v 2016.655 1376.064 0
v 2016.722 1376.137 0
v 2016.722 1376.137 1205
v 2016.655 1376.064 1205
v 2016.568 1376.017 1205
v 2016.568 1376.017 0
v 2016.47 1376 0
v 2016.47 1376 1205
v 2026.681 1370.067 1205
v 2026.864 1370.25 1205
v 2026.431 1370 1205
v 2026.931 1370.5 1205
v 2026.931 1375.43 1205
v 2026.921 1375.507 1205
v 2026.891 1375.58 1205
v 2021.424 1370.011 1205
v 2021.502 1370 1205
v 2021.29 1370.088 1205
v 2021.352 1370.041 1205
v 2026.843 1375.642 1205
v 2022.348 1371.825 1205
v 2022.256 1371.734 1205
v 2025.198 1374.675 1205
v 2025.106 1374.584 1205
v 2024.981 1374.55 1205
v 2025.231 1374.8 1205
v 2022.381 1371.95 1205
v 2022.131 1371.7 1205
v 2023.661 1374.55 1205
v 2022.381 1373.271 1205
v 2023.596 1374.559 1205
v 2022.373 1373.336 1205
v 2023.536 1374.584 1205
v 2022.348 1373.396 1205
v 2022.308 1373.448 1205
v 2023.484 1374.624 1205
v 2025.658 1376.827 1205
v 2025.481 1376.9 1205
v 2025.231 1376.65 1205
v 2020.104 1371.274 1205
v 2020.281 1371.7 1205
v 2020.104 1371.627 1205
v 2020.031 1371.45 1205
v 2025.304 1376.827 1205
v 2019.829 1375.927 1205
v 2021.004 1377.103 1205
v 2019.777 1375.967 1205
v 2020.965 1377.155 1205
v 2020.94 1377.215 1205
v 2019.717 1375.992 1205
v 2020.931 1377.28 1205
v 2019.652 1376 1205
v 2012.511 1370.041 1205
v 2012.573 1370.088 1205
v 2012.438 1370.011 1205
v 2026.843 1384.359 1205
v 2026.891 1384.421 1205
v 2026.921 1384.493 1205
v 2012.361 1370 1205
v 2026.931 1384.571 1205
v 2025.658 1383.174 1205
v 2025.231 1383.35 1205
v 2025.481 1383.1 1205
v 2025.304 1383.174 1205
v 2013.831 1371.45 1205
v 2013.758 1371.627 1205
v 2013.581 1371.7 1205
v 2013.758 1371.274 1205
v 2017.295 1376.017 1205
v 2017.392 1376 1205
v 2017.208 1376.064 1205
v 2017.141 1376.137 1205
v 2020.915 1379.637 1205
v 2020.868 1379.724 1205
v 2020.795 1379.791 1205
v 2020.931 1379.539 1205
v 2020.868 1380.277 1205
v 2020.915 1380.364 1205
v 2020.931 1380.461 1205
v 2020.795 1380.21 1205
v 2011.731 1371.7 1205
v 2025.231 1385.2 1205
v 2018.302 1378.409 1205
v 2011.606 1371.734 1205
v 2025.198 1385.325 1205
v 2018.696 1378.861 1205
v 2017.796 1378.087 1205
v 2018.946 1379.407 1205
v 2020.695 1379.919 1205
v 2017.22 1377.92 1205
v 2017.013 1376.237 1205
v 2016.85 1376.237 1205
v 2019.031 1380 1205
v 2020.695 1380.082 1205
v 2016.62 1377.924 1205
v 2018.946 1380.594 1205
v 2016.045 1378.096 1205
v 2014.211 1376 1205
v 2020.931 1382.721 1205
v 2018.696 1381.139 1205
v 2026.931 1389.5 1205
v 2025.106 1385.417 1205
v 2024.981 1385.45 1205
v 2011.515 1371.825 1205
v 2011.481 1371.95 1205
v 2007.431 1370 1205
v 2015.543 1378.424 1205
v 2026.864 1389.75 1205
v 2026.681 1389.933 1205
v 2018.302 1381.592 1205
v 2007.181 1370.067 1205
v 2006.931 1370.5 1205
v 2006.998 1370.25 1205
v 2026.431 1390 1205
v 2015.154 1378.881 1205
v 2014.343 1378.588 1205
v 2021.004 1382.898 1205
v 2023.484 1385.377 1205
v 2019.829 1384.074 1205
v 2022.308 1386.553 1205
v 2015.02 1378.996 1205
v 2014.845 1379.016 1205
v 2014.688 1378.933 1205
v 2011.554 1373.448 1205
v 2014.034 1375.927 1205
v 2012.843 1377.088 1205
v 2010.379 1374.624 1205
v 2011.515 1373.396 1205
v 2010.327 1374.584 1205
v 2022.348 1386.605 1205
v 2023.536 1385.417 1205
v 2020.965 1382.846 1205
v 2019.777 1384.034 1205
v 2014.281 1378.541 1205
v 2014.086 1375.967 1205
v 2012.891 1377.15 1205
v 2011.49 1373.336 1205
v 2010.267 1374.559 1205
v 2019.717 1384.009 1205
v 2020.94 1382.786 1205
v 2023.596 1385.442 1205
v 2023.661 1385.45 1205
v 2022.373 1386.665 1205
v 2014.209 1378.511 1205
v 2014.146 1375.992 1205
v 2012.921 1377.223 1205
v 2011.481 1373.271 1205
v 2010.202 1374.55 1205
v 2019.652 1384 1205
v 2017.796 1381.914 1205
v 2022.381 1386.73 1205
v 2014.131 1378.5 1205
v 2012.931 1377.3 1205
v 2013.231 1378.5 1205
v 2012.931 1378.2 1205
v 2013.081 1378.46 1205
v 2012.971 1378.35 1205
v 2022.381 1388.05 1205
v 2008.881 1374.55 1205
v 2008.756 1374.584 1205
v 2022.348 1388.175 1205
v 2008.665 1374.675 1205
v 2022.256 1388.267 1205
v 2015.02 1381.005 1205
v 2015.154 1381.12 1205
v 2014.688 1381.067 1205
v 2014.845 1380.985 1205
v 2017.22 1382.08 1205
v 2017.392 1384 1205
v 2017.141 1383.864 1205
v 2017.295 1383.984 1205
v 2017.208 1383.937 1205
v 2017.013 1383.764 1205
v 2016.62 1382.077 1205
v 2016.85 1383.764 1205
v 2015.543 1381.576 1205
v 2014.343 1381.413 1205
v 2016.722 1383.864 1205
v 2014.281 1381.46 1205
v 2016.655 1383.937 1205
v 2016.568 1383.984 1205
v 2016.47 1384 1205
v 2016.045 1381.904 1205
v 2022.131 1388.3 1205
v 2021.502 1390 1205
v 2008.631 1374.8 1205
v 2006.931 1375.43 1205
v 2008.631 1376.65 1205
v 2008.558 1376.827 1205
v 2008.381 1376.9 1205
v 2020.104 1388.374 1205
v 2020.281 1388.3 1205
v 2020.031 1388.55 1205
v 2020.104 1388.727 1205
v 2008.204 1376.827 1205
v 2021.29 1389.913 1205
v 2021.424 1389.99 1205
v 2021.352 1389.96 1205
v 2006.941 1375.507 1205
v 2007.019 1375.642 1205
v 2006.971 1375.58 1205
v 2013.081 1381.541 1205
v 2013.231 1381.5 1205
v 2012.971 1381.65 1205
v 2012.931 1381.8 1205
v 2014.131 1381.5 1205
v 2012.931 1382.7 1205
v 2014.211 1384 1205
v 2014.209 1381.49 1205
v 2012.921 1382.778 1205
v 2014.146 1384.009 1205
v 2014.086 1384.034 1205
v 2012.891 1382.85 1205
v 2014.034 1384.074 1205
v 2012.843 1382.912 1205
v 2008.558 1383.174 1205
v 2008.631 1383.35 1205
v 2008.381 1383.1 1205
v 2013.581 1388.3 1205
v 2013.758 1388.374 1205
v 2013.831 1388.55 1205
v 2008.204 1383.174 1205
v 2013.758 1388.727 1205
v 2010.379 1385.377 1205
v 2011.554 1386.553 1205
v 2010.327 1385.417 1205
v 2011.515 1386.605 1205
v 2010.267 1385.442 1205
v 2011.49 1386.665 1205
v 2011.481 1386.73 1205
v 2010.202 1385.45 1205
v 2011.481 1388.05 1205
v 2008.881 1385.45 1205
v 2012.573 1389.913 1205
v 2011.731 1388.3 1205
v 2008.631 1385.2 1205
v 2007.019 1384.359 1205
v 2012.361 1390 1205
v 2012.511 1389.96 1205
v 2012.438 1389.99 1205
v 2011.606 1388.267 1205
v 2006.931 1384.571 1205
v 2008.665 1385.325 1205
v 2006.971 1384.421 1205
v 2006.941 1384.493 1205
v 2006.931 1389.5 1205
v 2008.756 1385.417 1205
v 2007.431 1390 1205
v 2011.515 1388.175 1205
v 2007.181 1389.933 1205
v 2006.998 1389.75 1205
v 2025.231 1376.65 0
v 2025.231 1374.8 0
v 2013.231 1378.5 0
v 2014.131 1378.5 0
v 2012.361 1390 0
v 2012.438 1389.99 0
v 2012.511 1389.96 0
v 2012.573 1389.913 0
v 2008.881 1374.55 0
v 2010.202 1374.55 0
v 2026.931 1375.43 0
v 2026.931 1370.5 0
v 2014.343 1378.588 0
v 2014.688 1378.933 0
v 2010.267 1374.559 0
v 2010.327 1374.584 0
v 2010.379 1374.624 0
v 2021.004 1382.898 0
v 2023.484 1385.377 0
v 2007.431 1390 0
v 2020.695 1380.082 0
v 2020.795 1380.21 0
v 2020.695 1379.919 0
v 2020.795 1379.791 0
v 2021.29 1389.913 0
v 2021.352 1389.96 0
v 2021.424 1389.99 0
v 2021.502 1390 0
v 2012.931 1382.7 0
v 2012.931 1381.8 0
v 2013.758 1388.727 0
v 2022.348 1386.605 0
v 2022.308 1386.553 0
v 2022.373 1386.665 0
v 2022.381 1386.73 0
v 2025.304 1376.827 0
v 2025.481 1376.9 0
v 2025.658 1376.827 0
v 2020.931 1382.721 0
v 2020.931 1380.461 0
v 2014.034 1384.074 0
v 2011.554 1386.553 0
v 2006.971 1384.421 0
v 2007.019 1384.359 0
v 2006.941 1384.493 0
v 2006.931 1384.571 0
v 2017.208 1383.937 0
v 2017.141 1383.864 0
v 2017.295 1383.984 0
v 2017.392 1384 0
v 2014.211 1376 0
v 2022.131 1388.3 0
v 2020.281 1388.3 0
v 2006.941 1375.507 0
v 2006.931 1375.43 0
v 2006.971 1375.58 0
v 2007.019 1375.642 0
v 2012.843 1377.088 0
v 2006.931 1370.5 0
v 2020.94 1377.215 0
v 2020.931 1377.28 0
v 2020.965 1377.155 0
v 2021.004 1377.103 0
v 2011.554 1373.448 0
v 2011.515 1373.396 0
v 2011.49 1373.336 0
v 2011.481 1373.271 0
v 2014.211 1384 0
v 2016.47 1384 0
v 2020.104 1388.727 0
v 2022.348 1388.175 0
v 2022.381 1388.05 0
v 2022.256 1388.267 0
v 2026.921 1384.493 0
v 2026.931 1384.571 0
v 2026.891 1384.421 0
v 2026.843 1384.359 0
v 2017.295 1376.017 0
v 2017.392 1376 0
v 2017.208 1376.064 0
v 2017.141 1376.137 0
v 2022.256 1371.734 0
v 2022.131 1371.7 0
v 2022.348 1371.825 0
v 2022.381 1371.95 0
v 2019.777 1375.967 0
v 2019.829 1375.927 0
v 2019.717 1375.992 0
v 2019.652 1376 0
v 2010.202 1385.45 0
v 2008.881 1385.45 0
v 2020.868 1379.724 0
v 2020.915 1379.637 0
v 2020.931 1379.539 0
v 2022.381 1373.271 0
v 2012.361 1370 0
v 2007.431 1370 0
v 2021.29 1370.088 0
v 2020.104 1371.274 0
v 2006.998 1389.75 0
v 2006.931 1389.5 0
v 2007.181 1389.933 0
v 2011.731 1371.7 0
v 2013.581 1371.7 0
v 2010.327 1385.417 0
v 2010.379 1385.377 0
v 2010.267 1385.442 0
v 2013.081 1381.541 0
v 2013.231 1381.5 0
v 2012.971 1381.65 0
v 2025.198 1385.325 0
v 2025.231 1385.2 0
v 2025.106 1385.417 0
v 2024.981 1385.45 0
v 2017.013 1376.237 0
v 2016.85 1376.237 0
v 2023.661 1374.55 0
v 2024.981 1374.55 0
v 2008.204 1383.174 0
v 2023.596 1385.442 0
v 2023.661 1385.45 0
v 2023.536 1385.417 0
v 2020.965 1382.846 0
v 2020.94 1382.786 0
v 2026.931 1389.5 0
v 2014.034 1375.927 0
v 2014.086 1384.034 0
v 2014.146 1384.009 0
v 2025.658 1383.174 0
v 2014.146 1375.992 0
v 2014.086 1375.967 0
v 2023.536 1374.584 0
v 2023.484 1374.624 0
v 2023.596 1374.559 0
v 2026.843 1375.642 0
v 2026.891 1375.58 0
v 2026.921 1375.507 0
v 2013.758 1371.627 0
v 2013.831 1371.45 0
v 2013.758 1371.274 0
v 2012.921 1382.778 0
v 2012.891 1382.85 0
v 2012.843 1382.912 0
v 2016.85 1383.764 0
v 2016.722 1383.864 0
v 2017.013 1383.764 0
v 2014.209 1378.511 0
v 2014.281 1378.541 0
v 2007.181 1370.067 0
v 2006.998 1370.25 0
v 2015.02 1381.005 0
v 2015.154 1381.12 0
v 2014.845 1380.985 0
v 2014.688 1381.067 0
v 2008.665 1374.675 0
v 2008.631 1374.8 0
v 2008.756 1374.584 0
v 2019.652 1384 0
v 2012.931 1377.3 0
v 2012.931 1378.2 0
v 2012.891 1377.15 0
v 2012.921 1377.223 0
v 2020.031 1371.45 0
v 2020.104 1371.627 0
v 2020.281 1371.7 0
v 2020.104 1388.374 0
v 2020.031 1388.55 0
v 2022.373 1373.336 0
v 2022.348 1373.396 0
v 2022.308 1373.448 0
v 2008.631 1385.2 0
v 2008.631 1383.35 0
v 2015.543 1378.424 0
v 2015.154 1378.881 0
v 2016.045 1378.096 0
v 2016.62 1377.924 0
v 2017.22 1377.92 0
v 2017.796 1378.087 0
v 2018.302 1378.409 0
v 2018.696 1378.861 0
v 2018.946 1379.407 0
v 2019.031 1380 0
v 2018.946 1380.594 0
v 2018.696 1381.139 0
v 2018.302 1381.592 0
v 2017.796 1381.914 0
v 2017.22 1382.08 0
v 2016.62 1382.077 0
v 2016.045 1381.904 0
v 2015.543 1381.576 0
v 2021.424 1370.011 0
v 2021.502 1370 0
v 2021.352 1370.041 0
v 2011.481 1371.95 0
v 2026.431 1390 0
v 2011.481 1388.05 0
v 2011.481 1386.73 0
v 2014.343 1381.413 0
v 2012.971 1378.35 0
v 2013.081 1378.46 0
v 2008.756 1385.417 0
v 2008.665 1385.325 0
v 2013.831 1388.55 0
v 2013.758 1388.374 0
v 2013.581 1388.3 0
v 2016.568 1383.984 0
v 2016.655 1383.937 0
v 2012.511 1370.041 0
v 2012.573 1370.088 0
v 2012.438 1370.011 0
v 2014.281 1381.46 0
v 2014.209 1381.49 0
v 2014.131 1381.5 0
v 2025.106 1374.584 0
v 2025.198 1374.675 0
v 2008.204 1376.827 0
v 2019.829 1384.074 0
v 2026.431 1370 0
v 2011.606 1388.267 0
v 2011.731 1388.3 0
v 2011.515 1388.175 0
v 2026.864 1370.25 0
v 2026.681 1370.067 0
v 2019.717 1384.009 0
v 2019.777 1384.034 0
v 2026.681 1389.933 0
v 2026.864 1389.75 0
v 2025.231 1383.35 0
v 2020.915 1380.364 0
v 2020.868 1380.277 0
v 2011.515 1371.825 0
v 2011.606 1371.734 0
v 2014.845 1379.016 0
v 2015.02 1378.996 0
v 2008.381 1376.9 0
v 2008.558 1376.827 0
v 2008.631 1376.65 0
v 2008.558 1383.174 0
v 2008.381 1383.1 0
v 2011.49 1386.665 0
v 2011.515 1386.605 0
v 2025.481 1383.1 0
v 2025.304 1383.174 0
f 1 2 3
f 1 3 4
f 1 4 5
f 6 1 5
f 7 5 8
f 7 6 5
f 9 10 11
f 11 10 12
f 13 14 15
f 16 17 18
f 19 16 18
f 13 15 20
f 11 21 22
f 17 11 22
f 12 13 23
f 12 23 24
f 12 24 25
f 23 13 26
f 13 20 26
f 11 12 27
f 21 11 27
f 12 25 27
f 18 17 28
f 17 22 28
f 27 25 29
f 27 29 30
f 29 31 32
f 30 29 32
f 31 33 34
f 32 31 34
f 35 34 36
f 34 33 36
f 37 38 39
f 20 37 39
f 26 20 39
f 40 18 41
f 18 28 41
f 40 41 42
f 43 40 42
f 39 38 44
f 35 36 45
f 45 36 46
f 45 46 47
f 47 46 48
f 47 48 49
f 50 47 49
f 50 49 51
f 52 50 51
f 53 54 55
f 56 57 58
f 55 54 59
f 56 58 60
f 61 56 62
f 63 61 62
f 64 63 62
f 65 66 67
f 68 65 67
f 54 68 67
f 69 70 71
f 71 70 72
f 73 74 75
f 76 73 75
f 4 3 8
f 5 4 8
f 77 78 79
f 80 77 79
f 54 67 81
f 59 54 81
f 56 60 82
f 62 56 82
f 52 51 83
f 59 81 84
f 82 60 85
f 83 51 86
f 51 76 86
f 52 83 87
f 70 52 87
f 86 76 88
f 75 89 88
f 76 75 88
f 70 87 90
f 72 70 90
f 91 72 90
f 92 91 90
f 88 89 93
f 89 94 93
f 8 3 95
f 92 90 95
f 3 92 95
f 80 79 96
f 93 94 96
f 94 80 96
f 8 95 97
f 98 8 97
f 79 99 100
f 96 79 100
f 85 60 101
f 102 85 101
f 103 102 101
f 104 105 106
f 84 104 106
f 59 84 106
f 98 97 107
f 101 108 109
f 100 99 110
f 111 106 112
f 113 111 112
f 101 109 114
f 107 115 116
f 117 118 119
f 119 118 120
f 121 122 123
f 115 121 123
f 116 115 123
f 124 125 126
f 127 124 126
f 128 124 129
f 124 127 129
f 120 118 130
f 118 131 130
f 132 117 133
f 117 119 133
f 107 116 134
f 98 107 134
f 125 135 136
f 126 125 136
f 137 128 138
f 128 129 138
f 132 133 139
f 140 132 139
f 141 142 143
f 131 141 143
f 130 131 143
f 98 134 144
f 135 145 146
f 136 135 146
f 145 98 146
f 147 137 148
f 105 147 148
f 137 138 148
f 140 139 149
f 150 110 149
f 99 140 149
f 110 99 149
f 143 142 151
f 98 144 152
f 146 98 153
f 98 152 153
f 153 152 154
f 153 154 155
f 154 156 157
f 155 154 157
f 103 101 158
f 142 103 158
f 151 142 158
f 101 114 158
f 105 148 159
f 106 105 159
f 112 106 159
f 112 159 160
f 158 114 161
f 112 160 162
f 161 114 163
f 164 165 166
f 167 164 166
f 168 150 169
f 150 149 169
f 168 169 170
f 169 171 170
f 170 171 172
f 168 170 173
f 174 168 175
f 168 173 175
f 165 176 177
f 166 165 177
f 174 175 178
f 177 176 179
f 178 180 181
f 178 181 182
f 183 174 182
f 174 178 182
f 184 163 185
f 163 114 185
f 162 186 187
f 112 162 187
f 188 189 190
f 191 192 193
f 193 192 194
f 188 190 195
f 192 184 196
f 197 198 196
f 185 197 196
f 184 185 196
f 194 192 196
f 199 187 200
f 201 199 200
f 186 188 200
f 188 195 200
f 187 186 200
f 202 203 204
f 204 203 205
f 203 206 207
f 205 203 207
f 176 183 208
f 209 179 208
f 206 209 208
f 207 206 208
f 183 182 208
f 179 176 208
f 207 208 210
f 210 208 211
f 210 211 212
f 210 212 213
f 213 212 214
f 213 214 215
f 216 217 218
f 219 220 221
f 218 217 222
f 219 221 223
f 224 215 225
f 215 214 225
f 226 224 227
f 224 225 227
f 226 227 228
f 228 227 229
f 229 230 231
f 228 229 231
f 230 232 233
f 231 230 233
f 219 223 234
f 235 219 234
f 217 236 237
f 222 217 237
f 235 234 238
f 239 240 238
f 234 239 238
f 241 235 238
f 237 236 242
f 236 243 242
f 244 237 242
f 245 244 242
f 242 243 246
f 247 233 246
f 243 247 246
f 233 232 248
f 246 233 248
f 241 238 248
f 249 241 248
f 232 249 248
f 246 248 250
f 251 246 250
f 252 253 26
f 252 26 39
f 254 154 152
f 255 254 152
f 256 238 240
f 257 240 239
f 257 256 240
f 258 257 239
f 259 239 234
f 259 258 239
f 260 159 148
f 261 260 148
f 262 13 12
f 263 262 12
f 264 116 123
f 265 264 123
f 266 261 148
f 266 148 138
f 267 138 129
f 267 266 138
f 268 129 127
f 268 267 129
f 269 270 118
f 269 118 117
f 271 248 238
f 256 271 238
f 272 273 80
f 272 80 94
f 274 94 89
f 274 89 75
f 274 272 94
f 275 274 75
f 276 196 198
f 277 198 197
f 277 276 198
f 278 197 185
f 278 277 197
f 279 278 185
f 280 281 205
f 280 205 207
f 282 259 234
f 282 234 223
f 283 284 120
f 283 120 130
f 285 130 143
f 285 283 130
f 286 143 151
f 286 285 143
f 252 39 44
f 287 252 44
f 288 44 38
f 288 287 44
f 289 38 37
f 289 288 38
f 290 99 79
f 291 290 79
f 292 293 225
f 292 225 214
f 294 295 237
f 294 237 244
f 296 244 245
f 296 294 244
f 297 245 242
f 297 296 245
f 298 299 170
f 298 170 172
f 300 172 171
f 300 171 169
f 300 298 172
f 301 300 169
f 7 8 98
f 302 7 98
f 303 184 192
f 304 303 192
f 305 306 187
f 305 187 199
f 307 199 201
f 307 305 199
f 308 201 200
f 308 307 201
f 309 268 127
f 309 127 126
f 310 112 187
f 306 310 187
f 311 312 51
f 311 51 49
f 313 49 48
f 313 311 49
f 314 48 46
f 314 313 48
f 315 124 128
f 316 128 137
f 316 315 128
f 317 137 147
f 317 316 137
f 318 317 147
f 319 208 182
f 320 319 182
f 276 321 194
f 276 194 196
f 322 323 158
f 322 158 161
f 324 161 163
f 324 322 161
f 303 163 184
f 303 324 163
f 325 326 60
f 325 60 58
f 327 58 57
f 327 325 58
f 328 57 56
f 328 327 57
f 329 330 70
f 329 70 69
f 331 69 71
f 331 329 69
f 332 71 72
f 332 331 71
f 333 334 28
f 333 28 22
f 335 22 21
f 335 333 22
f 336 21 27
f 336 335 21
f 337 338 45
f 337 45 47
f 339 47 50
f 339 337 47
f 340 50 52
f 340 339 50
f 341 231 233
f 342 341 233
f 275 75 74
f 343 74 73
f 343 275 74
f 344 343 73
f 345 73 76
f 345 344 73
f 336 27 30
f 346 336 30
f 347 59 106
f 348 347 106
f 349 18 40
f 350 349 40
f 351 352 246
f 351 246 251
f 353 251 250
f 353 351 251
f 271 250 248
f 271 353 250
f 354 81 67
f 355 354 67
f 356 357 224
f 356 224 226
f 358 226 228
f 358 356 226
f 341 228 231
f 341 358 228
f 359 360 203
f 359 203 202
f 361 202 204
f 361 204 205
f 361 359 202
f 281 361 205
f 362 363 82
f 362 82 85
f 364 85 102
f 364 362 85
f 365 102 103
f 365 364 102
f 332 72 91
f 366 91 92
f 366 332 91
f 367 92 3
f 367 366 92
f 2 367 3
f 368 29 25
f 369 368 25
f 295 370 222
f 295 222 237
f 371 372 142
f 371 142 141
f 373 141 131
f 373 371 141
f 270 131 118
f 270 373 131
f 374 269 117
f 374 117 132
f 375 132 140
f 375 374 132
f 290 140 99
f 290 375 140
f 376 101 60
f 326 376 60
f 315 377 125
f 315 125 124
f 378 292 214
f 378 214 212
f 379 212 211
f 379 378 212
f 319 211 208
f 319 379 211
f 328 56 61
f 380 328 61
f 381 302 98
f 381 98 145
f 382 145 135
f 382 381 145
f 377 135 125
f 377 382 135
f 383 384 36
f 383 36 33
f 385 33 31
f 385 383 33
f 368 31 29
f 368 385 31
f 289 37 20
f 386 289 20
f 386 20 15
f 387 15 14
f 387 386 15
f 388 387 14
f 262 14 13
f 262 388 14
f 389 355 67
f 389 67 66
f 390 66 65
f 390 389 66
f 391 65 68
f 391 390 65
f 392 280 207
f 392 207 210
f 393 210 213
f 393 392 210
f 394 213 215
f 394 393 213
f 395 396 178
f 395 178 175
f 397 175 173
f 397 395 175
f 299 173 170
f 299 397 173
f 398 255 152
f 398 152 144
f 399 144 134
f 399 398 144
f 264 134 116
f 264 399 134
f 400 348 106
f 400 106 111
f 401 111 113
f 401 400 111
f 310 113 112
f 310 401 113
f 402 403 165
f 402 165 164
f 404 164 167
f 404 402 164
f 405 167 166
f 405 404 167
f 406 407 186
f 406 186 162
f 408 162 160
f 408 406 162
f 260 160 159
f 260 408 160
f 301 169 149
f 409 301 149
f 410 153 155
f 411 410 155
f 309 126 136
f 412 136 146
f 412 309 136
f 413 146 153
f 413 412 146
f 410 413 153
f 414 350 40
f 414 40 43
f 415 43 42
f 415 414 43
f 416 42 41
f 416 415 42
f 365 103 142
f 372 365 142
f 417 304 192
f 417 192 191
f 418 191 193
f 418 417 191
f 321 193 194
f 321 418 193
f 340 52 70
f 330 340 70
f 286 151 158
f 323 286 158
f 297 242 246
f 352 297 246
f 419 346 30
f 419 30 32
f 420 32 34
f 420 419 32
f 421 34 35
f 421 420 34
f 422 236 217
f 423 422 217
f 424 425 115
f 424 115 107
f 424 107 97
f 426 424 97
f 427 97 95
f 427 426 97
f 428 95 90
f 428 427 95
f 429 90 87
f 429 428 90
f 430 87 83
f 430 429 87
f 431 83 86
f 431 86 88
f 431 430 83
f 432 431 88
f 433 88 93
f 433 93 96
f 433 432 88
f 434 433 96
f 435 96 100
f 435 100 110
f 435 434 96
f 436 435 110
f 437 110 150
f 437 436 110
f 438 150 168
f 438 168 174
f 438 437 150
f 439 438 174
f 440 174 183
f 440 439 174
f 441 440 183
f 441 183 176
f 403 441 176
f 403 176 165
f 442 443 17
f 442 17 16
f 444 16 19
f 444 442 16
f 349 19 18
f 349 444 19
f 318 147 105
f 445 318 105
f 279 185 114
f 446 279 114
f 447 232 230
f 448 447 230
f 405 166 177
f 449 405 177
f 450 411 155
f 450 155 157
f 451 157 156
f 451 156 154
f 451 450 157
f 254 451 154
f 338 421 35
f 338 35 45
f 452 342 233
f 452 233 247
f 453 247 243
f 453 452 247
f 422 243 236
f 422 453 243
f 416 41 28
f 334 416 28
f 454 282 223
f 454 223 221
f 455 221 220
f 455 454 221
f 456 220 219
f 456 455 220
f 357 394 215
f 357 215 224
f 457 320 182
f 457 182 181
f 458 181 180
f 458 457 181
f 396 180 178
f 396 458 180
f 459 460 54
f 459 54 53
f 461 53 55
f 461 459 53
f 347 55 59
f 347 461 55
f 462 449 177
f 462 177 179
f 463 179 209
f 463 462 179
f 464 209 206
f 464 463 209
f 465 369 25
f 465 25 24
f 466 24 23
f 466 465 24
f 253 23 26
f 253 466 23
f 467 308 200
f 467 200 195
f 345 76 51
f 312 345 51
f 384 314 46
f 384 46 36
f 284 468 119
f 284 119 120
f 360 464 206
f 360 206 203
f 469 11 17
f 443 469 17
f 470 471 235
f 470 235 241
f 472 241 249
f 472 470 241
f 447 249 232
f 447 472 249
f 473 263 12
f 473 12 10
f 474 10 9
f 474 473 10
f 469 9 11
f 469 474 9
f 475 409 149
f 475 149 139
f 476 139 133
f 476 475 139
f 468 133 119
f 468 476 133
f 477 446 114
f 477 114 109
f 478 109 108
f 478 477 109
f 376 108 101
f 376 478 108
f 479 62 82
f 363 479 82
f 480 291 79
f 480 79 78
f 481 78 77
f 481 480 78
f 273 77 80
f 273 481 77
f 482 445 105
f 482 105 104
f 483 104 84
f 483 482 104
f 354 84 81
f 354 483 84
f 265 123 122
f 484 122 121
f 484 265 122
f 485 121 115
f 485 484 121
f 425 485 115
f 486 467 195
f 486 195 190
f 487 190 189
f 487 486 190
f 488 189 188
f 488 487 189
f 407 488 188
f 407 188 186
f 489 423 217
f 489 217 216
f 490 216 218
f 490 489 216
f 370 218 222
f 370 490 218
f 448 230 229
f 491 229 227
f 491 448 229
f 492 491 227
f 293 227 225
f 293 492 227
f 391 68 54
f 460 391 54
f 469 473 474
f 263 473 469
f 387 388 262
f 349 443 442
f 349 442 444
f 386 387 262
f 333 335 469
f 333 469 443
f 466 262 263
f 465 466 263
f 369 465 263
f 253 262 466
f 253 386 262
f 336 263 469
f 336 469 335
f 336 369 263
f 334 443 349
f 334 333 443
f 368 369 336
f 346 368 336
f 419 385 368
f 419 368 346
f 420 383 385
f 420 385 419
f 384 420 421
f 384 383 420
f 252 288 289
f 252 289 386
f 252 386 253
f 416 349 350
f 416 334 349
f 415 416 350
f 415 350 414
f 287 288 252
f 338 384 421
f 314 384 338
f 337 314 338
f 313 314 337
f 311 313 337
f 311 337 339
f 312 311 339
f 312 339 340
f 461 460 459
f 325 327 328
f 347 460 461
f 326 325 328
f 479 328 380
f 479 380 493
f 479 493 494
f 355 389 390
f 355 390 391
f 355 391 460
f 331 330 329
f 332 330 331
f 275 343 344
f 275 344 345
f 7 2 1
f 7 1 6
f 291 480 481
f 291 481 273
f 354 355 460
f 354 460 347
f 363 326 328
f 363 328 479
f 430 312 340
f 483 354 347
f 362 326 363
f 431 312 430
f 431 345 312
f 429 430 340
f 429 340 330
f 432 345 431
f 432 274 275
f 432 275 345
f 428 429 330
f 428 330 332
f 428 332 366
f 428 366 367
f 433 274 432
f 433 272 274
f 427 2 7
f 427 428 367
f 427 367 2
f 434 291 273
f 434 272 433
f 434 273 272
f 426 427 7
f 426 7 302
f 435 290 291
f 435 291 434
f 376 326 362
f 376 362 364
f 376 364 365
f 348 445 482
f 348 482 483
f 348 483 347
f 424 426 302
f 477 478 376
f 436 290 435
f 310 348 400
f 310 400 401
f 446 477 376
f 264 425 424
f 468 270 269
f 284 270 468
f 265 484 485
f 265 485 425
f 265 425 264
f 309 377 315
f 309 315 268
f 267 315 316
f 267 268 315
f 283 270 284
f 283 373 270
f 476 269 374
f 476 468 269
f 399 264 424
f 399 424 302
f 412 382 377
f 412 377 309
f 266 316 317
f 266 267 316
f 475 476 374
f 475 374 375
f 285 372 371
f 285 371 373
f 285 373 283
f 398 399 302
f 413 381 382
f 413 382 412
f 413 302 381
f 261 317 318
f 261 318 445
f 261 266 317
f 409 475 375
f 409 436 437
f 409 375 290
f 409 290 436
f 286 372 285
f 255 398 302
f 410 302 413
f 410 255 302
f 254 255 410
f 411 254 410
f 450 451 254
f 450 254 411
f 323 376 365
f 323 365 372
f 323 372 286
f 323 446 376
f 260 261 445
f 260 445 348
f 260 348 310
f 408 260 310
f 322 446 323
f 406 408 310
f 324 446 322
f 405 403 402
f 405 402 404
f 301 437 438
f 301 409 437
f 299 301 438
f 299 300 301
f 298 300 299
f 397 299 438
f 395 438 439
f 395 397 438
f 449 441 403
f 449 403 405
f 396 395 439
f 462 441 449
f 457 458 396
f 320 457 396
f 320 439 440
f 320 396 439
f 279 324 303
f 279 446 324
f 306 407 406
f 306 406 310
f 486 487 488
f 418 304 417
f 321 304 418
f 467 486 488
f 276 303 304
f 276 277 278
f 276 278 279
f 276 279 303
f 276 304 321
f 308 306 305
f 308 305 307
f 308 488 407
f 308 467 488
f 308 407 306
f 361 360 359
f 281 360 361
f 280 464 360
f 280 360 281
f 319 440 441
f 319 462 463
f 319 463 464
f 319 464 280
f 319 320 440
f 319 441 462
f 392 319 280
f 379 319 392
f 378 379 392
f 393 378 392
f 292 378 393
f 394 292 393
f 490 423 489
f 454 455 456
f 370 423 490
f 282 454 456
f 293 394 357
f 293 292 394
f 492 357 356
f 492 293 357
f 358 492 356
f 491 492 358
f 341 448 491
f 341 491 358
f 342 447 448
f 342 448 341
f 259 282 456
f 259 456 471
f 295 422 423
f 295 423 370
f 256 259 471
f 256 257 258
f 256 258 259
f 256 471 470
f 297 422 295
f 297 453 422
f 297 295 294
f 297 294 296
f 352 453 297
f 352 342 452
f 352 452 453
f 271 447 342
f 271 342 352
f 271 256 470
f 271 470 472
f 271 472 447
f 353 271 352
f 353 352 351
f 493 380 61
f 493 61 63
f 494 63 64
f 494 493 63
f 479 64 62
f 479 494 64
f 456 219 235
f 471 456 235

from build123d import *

# Parameters (mm, degrees)
BOSS_EXTRUDE1_DEPTH = 1205


with BuildPart() as part:
    # Model → Boss-Extrude1 (new body)
    with BuildSketch(Plane.XY):
        with BuildLine():
            Line((2013.231211125, 1378.500393717), (2014.131175411, 1378.500393717))
            ThreePointArc((2014.131175411, 1378.500393717), (2014.245980441, 1378.523229857), (2014.343307446, 1378.588261683))
            Line((2014.343307446, 1378.588261683), (2014.688390533, 1378.93334477))
            ThreePointArc((2014.688390533, 1378.93334477), (2014.933942847, 1379.019345399), (2015.154358637, 1378.881110358))
            ThreePointArc((2015.154358637, 1378.881110358), (2019.031211125, 1380.000393717), (2015.154358637, 1381.119677076))
            ThreePointArc((2015.154358637, 1381.119677076), (2014.933942847, 1380.981442035), (2014.688390533, 1381.067442664))
            Line((2014.688390533, 1381.067442664), (2014.343307446, 1381.412525751))
            ThreePointArc((2014.343307446, 1381.412525751), (2014.245980441, 1381.477557577), (2014.131175412, 1381.500393717))
            Line((2014.131175412, 1381.500393717), (2013.231211125, 1381.500393717))
            ThreePointArc((2013.231211125, 1381.500393717), (2013.01907909, 1381.588261683), (2012.931211125, 1381.800393717))
            Line((2012.931211125, 1381.800393717), (2012.931211125, 1382.700358004))
            ThreePointArc((2012.931211125, 1382.700358004), (2012.908374985, 1382.815163033), (2012.843343159, 1382.912490038))
            Line((2012.843343159, 1382.912490038), (2010.378662785, 1385.377170412))
            ThreePointArc((2010.378662785, 1385.377170412), (2010.297556948, 1385.4313636), (2010.20188609, 1385.450393717))
            Line((2010.20188609, 1385.450393717), (2008.881211125, 1385.450393717))
            ThreePointArc((2008.881211125, 1385.450393717), (2008.70443443, 1385.377170412), (2008.631211125, 1385.200393717))
            Line((2008.631211125, 1385.200393717), (2008.631211125, 1383.350393717))
            ThreePointArc((2008.631211125, 1383.350393717), (2008.476881983, 1383.119423834), (2008.20443443, 1383.173617022))
            Line((2008.20443443, 1383.173617022), (2007.01907909, 1384.358972361))
            ThreePointArc((2007.01907909, 1384.358972361), (2006.954047265, 1384.456299366), (2006.931211125, 1384.571104395))
            Line((2006.931211125, 1384.571104395), (2006.931211125, 1389.500393717))
            ThreePointArc((2006.931211125, 1389.500393717), (2007.077657734, 1389.853947108), (2007.431211125, 1390.000393717))
            Line((2007.431211125, 1390.000393717), (2012.360500447, 1390.000393717))
            ThreePointArc((2012.360500447, 1390.000393717), (2012.475305476, 1389.977557577), (2012.572632481, 1389.912525752))
            Line((2012.572632481, 1389.912525752), (2013.75798782, 1388.727170412))
            ThreePointArc((2013.75798782, 1388.727170412), (2013.812181008, 1388.454722859), (2013.581211125, 1388.300393717))
            Line((2013.581211125, 1388.300393717), (2011.731211125, 1388.300393717))
            ThreePointArc((2011.731211125, 1388.300393717), (2011.55443443, 1388.227170412), (2011.481211125, 1388.050393717))
            Line((2011.481211125, 1388.050393717), (2011.481211125, 1386.729718752))
            ThreePointArc((2011.481211125, 1386.729718752), (2011.500241242, 1386.634047894), (2011.55443443, 1386.552942057))
            Line((2011.55443443, 1386.552942057), (2014.033759465, 1384.073617022))
            ThreePointArc((2014.033759465, 1384.073617022), (2014.114865302, 1384.019423834), (2014.21053616, 1384.000393717))
            Line((2014.21053616, 1384.000393717), (2016.470233902, 1384.000393717))
            ThreePointArc((2016.470233902, 1384.000393717), (2016.61325329, 1383.964108439), (2016.721676023, 1383.864030081))
            ThreePointArc((2016.721676023, 1383.864030081), (2016.931211125, 1383.750393717), (2017.140746226, 1383.864030081))
            ThreePointArc((2017.140746226, 1383.864030081), (2017.24916896, 1383.964108439), (2017.392188348, 1384.000393717))
            Line((2017.392188348, 1384.000393717), (2019.65188609, 1384.000393717))
            ThreePointArc((2019.65188609, 1384.000393717), (2019.747556948, 1384.019423834), (2019.828662785, 1384.073617022))
            Line((2019.828662785, 1384.073617022), (2022.30798782, 1386.552942057))
            ThreePointArc((2022.30798782, 1386.552942057), (2022.362181008, 1386.634047894), (2022.381211125, 1386.729718752))
            Line((2022.381211125, 1386.729718752), (2022.381211125, 1388.050393717))
            ThreePointArc((2022.381211125, 1388.050393717), (2022.30798782, 1388.227170412), (2022.131211125, 1388.300393717))
            Line((2022.131211125, 1388.300393717), (2020.281211125, 1388.300393717))
            ThreePointArc((2020.281211125, 1388.300393717), (2020.050241242, 1388.454722859), (2020.10443443, 1388.727170412))
            Line((2020.10443443, 1388.727170412), (2021.289789769, 1389.912525752))
            ThreePointArc((2021.289789769, 1389.912525752), (2021.387116773, 1389.977557577), (2021.501921803, 1390.000393717))
            Line((2021.501921803, 1390.000393717), (2026.431211125, 1390.000393717))
            ThreePointArc((2026.431211125, 1390.000393717), (2026.784764515, 1389.853947108), (2026.931211125, 1389.500393717))
            Line((2026.931211125, 1389.500393717), (2026.931211125, 1384.571104395))
            ThreePointArc((2026.931211125, 1384.571104395), (2026.908374985, 1384.456299366), (2026.843343159, 1384.358972361))
            Line((2026.843343159, 1384.358972361), (2025.65798782, 1383.173617022))
            ThreePointArc((2025.65798782, 1383.173617022), (2025.385540267, 1383.119423834), (2025.231211125, 1383.350393717))
            Line((2025.231211125, 1383.350393717), (2025.231211125, 1385.200393717))
            ThreePointArc((2025.231211125, 1385.200393717), (2025.15798782, 1385.377170412), (2024.981211125, 1385.450393717))
            Line((2024.981211125, 1385.450393717), (2023.66053616, 1385.450393717))
            ThreePointArc((2023.66053616, 1385.450393717), (2023.564865302, 1385.4313636), (2023.483759465, 1385.377170412))
            Line((2023.483759465, 1385.377170412), (2021.00443443, 1382.897845377))
            ThreePointArc((2021.00443443, 1382.897845377), (2020.950241242, 1382.81673954), (2020.931211125, 1382.721068682))
            Line((2020.931211125, 1382.721068682), (2020.931211125, 1380.46137094))
            ThreePointArc((2020.931211125, 1380.46137094), (2020.894925847, 1380.318351552), (2020.794847489, 1380.209928818))
            ThreePointArc((2020.794847489, 1380.209928818), (2020.681211125, 1380.000393717), (2020.794847488, 1379.790858616))
            ThreePointArc((2020.794847488, 1379.790858616), (2020.894925847, 1379.682435882), (2020.931211125, 1379.539416494))
            Line((2020.931211125, 1379.539416494), (2020.931211125, 1377.279718752))
            ThreePointArc((2020.931211125, 1377.279718752), (2020.950241242, 1377.184047894), (2021.00443443, 1377.102942057))
            Line((2021.00443443, 1377.102942057), (2023.483759465, 1374.623617022))
            ThreePointArc((2023.483759465, 1374.623617022), (2023.564865302, 1374.569423834), (2023.66053616, 1374.550393717))
            Line((2023.66053616, 1374.550393717), (2024.981211125, 1374.550393717))
            ThreePointArc((2024.981211125, 1374.550393717), (2025.15798782, 1374.623617022), (2025.231211125, 1374.800393717))
            Line((2025.231211125, 1374.800393717), (2025.231211125, 1376.650393717))
            ThreePointArc((2025.231211125, 1376.650393717), (2025.385540267, 1376.8813636), (2025.65798782, 1376.827170412))
            Line((2025.65798782, 1376.827170412), (2026.843343159, 1375.641815073))
            ThreePointArc((2026.843343159, 1375.641815073), (2026.908374985, 1375.544488069), (2026.931211125, 1375.429683039))
            Line((2026.931211125, 1375.429683039), (2026.931211125, 1370.500393717))
            ThreePointArc((2026.931211125, 1370.500393717), (2026.784764515, 1370.146840327), (2026.431211125, 1370.000393717))
            Line((2026.431211125, 1370.000393717), (2021.501921803, 1370.000393717))
            ThreePointArc((2021.501921803, 1370.000393717), (2021.387116773, 1370.023229857), (2021.289789769, 1370.088261683))
            Line((2021.289789769, 1370.088261683), (2020.10443443, 1371.273617022))
            ThreePointArc((2020.10443443, 1371.273617022), (2020.050241242, 1371.546064575), (2020.281211125, 1371.700393717))
            Line((2020.281211125, 1371.700393717), (2022.131211125, 1371.700393717))
            ThreePointArc((2022.131211125, 1371.700393717), (2022.30798782, 1371.773617022), (2022.381211125, 1371.950393717))
            Line((2022.381211125, 1371.950393717), (2022.381211125, 1373.271068682))
            ThreePointArc((2022.381211125, 1373.271068682), (2022.362181008, 1373.36673954), (2022.30798782, 1373.447845377))
            Line((2022.30798782, 1373.447845377), (2019.828662785, 1375.927170412))
            ThreePointArc((2019.828662785, 1375.927170412), (2019.747556948, 1375.9813636), (2019.65188609, 1376.000393717))
            Line((2019.65188609, 1376.000393717), (2017.392188348, 1376.000393717))
            ThreePointArc((2017.392188348, 1376.000393717), (2017.24916896, 1376.036678995), (2017.140746226, 1376.136757353))
            ThreePointArc((2017.140746226, 1376.136757353), (2016.931211125, 1376.250393717), (2016.721676023, 1376.136757354))
            ThreePointArc((2016.721676023, 1376.136757354), (2016.61325329, 1376.036678995), (2016.470233902, 1376.000393717))
            Line((2016.470233902, 1376.000393717), (2014.21053616, 1376.000393717))
            ThreePointArc((2014.21053616, 1376.000393717), (2014.114865302, 1375.9813636), (2014.033759465, 1375.927170412))
            Line((2014.033759465, 1375.927170412), (2011.55443443, 1373.447845377))
            ThreePointArc((2011.55443443, 1373.447845377), (2011.500241242, 1373.36673954), (2011.481211125, 1373.271068682))
            Line((2011.481211125, 1373.271068682), (2011.481211125, 1371.950393717))
            ThreePointArc((2011.481211125, 1371.950393717), (2011.55443443, 1371.773617022), (2011.731211125, 1371.700393717))
            Line((2011.731211125, 1371.700393717), (2013.581211125, 1371.700393717))
            ThreePointArc((2013.581211125, 1371.700393717), (2013.812181008, 1371.546064575), (2013.75798782, 1371.273617022))
            Line((2013.75798782, 1371.273617022), (2012.572632481, 1370.088261683))
            ThreePointArc((2012.572632481, 1370.088261683), (2012.475305476, 1370.023229857), (2012.360500447, 1370.000393717))
            Line((2012.360500447, 1370.000393717), (2007.431211125, 1370.000393717))
            ThreePointArc((2007.431211125, 1370.000393717), (2007.077657734, 1370.146840327), (2006.931211125, 1370.500393717))
            Line((2006.931211125, 1370.500393717), (2006.931211125, 1375.429683039))
            ThreePointArc((2006.931211125, 1375.429683039), (2006.954047265, 1375.544488069), (2007.01907909, 1375.641815073))
            Line((2007.01907909, 1375.641815073), (2008.20443443, 1376.827170412))
            ThreePointArc((2008.20443443, 1376.827170412), (2008.476881983, 1376.8813636), (2008.631211125, 1376.650393717))
            Line((2008.631211125, 1376.650393717), (2008.631211125, 1374.800393717))
            ThreePointArc((2008.631211125, 1374.800393717), (2008.70443443, 1374.623617022), (2008.881211125, 1374.550393717))
            Line((2008.881211125, 1374.550393717), (2010.20188609, 1374.550393717))
            ThreePointArc((2010.20188609, 1374.550393717), (2010.297556948, 1374.569423834), (2010.378662785, 1374.623617022))
            Line((2010.378662785, 1374.623617022), (2012.843343159, 1377.088297396))
            ThreePointArc((2012.843343159, 1377.088297396), (2012.908374985, 1377.185624401), (2012.931211125, 1377.300429431))
            Line((2012.931211125, 1377.300429431), (2012.931211125, 1378.200393717))
            ThreePointArc((2012.931211125, 1378.200393717), (2013.01907909, 1378.412525751), (2013.231211125, 1378.500393717))
        make_face()
    extrude(amount=BOSS_EXTRUDE1_DEPTH)


solid = part.part
